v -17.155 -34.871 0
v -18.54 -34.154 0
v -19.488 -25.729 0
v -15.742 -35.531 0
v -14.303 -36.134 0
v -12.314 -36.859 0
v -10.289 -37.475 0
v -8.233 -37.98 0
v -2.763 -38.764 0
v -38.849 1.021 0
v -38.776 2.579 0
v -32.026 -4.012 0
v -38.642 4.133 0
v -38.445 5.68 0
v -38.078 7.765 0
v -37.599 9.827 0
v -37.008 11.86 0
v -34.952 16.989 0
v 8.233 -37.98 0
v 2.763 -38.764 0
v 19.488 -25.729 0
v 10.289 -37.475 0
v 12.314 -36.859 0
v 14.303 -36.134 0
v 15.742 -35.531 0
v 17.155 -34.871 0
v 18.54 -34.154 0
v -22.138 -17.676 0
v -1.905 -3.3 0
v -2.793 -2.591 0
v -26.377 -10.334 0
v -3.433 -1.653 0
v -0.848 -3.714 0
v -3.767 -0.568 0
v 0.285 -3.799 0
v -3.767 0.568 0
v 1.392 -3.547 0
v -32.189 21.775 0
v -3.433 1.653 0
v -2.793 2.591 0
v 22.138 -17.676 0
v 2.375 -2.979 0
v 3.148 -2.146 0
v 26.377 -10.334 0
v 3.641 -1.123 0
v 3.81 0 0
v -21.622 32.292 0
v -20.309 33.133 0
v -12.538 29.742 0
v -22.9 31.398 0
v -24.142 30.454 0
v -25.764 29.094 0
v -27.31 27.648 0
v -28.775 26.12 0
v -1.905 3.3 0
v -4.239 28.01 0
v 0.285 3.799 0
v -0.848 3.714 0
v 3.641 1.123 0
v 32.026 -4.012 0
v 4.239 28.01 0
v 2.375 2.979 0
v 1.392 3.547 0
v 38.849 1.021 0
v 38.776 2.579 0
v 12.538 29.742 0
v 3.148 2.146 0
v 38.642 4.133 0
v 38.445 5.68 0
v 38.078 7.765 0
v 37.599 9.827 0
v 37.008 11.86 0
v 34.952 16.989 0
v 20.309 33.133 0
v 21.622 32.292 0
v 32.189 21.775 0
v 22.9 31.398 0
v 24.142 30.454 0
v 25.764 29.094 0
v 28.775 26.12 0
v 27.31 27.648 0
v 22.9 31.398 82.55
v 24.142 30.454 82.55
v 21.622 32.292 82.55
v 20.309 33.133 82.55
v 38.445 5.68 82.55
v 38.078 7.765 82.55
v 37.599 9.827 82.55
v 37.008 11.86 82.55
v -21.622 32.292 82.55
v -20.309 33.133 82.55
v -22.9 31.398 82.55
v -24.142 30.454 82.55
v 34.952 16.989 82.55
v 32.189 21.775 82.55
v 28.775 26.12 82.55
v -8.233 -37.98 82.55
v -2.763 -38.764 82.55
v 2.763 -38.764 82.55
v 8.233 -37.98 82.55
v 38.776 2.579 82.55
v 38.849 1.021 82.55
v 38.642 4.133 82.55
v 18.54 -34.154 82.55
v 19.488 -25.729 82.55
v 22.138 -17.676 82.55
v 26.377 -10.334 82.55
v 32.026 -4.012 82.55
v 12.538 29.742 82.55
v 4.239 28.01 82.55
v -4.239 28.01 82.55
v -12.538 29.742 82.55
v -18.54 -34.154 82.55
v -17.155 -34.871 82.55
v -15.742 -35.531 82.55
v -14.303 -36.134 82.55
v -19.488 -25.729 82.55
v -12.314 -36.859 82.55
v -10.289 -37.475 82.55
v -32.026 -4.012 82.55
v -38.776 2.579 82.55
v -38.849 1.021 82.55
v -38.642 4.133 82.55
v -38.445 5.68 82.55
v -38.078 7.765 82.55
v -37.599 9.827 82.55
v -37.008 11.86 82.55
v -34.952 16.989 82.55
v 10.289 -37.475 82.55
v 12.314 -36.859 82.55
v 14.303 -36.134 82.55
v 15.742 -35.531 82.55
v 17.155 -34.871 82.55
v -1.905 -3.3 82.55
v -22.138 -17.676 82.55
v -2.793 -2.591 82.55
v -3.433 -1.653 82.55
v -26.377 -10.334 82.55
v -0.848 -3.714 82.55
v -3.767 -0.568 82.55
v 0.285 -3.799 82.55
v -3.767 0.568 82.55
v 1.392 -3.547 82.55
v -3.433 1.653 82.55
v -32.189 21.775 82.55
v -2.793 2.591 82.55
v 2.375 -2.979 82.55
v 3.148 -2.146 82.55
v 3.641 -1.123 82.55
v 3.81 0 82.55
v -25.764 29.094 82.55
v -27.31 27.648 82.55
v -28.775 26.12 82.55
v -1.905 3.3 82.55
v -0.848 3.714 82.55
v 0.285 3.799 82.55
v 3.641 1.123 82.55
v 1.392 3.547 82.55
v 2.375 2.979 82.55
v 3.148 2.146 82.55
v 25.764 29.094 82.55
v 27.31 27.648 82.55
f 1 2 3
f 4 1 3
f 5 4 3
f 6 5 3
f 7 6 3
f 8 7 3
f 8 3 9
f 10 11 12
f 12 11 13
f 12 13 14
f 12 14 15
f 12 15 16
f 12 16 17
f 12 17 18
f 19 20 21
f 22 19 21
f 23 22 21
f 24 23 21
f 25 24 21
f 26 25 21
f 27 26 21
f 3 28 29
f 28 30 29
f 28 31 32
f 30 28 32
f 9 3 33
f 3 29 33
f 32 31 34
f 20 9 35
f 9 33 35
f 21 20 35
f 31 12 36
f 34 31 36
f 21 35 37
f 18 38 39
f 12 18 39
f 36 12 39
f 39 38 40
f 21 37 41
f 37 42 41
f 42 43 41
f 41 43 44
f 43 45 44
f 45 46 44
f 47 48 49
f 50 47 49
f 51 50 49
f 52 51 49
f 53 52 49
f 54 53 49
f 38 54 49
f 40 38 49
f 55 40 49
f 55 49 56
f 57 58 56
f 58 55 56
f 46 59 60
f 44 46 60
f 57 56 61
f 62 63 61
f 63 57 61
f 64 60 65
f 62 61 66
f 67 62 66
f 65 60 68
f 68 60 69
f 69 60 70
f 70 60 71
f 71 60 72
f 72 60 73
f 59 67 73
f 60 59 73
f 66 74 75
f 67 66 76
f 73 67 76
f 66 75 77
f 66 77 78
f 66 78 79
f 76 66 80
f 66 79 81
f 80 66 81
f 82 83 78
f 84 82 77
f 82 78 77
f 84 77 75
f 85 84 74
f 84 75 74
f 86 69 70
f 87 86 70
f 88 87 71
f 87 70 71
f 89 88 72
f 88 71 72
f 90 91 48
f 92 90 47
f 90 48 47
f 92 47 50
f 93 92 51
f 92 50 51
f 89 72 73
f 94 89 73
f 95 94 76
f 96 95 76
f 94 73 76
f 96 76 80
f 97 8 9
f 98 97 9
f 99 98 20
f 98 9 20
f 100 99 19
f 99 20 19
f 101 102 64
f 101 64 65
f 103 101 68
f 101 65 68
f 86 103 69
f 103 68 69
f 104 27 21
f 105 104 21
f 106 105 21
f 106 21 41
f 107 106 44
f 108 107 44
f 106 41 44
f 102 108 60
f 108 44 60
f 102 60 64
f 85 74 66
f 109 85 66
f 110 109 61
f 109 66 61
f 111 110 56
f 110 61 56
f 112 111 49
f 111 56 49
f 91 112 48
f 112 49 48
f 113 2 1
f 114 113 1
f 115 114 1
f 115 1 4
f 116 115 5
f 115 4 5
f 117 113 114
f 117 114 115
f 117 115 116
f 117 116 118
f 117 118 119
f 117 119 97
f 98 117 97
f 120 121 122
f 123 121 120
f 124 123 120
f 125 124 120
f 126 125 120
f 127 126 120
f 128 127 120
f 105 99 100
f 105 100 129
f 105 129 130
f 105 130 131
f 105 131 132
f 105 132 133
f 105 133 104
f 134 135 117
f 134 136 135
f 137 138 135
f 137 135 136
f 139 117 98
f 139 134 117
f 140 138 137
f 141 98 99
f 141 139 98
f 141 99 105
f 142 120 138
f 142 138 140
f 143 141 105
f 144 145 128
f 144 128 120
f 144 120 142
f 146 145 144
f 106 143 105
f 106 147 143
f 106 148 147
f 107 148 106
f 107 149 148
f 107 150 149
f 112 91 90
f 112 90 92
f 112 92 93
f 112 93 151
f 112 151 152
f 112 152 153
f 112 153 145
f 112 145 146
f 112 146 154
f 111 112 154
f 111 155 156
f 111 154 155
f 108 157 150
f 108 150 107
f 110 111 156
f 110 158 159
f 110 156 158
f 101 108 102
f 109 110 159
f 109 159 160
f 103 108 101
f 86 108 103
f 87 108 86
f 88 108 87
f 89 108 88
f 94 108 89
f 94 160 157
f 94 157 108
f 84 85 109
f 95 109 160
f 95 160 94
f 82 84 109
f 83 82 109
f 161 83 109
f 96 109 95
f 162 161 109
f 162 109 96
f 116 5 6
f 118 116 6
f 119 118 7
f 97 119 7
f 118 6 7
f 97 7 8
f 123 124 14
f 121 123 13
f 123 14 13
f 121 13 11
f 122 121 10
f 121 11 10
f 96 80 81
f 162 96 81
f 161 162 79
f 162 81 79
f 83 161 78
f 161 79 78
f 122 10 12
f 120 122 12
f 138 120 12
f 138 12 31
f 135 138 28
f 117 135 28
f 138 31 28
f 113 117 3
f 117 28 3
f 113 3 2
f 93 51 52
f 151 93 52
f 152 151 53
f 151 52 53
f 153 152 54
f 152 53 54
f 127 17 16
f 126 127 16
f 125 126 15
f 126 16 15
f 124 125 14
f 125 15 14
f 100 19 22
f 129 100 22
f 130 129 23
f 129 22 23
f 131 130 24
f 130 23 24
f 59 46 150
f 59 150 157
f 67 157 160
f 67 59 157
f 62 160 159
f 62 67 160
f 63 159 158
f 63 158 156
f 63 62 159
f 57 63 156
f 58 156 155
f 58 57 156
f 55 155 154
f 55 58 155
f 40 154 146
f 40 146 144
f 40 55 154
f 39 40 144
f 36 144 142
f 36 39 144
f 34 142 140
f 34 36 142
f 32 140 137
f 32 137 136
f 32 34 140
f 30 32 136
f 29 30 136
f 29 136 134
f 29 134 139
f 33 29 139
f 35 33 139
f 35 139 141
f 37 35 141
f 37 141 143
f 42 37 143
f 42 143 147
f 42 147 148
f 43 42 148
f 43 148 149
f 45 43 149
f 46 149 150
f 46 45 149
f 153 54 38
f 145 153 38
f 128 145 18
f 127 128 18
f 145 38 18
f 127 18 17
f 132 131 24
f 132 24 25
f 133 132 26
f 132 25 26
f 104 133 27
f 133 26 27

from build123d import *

# Parameters (mm, degrees)
F0_R     = 3.81
F1_DEPTH = 82.55


with BuildPart() as f1:
    # F0 (on Top) → F1 (new body)
    with BuildSketch(Plane.XY):
        with BuildLine():
            ThreePointArc((20.308533, 33.133345), (0, 27.791465), (-20.308533, 33.133345))
            ThreePointArc((-20.308533, 33.133345), (-22.265361, 31.851354), (-24.141506, 30.453944))
            ThreePointArc((-24.141506, 30.453944), (-24.378061, 26.06285), (-28.775153, 26.119832))
            ThreePointArc((-28.775153, 26.119832), (-33.655479, 19.431), (-37.008014, 11.860098))
            ThreePointArc((-37.008014, 11.860098), (-34.76012, 8.080595), (-38.444642, 5.680186))
            ThreePointArc((-38.444642, 5.680186), (-38.716762, 3.356691), (-38.848585, 1.021033))
            ThreePointArc((-38.848585, 1.021033), (-24.068115, -13.895732), (-18.540052, -34.154378))
            ThreePointArc((-18.540052, -34.154378), (-16.451401, -35.208045), (-14.303136, -36.13413))
            ThreePointArc((-14.303136, -36.13413), (-10.382059, -34.143445), (-8.232861, -37.979929))
            ThreePointArc((-8.232861, -37.979929), (0, -38.862), (8.232861, -37.979929))
            ThreePointArc((8.232861, -37.979929), (10.382059, -34.143445), (14.303136, -36.13413))
            ThreePointArc((14.303136, -36.13413), (16.451401, -35.208045), (18.540052, -34.154378))
            ThreePointArc((18.540052, -34.154378), (24.068115, -13.895732), (38.848585, 1.021033))
            ThreePointArc((38.848585, 1.021033), (38.716762, 3.356691), (38.444642, 5.680186))
            ThreePointArc((38.444642, 5.680186), (34.76012, 8.080595), (37.008014, 11.860098))
            ThreePointArc((37.008014, 11.860098), (33.655479, 19.431), (28.775153, 26.119832))
            ThreePointArc((28.775153, 26.119832), (24.378061, 26.06285), (24.141506, 30.453944))
            ThreePointArc((24.141506, 30.453944), (22.265361, 31.851354), (20.308533, 33.133345))
        make_face()
        Circle(F0_R, mode=Mode.SUBTRACT)
        with BuildLine():
            ThreePointArc((-28.775153, 26.119832), (-24.378061, 26.06285), (-24.141506, 30.453944))
            ThreePointArc((-24.141506, 30.453944), (-26.546927, 28.381608), (-28.775153, 26.119832))
        make_face()
        with BuildLine():
            ThreePointArc((28.775153, 26.119832), (26.546927, 28.381608), (24.141506, 30.453944))
            ThreePointArc((24.141506, 30.453944), (24.378061, 26.06285), (28.775153, 26.119832))
        make_face()
        with BuildLine():
            ThreePointArc((-38.444642, 5.680186), (-34.76012, 8.080595), (-37.008014, 11.860098))
            ThreePointArc((-37.008014, 11.860098), (-37.852658, 8.799509), (-38.444642, 5.680186))
        make_face()
        with BuildLine():
            ThreePointArc((38.444642, 5.680186), (37.852658, 8.799509), (37.008014, 11.860098))
            ThreePointArc((37.008014, 11.860098), (34.76012, 8.080595), (38.444642, 5.680186))
        make_face()
        with BuildLine():
            ThreePointArc((-8.232861, -37.979929), (-10.382059, -34.143445), (-14.303136, -36.13413))
            ThreePointArc((-14.303136, -36.13413), (-11.30573, -37.181118), (-8.232861, -37.979929))
        make_face()
        with BuildLine():
            ThreePointArc((8.232861, -37.979929), (11.30573, -37.181118), (14.303136, -36.13413))
            ThreePointArc((14.303136, -36.13413), (10.382059, -34.143445), (8.232861, -37.979929))
        make_face()
    extrude(amount=F1_DEPTH)


solid = f1.part
